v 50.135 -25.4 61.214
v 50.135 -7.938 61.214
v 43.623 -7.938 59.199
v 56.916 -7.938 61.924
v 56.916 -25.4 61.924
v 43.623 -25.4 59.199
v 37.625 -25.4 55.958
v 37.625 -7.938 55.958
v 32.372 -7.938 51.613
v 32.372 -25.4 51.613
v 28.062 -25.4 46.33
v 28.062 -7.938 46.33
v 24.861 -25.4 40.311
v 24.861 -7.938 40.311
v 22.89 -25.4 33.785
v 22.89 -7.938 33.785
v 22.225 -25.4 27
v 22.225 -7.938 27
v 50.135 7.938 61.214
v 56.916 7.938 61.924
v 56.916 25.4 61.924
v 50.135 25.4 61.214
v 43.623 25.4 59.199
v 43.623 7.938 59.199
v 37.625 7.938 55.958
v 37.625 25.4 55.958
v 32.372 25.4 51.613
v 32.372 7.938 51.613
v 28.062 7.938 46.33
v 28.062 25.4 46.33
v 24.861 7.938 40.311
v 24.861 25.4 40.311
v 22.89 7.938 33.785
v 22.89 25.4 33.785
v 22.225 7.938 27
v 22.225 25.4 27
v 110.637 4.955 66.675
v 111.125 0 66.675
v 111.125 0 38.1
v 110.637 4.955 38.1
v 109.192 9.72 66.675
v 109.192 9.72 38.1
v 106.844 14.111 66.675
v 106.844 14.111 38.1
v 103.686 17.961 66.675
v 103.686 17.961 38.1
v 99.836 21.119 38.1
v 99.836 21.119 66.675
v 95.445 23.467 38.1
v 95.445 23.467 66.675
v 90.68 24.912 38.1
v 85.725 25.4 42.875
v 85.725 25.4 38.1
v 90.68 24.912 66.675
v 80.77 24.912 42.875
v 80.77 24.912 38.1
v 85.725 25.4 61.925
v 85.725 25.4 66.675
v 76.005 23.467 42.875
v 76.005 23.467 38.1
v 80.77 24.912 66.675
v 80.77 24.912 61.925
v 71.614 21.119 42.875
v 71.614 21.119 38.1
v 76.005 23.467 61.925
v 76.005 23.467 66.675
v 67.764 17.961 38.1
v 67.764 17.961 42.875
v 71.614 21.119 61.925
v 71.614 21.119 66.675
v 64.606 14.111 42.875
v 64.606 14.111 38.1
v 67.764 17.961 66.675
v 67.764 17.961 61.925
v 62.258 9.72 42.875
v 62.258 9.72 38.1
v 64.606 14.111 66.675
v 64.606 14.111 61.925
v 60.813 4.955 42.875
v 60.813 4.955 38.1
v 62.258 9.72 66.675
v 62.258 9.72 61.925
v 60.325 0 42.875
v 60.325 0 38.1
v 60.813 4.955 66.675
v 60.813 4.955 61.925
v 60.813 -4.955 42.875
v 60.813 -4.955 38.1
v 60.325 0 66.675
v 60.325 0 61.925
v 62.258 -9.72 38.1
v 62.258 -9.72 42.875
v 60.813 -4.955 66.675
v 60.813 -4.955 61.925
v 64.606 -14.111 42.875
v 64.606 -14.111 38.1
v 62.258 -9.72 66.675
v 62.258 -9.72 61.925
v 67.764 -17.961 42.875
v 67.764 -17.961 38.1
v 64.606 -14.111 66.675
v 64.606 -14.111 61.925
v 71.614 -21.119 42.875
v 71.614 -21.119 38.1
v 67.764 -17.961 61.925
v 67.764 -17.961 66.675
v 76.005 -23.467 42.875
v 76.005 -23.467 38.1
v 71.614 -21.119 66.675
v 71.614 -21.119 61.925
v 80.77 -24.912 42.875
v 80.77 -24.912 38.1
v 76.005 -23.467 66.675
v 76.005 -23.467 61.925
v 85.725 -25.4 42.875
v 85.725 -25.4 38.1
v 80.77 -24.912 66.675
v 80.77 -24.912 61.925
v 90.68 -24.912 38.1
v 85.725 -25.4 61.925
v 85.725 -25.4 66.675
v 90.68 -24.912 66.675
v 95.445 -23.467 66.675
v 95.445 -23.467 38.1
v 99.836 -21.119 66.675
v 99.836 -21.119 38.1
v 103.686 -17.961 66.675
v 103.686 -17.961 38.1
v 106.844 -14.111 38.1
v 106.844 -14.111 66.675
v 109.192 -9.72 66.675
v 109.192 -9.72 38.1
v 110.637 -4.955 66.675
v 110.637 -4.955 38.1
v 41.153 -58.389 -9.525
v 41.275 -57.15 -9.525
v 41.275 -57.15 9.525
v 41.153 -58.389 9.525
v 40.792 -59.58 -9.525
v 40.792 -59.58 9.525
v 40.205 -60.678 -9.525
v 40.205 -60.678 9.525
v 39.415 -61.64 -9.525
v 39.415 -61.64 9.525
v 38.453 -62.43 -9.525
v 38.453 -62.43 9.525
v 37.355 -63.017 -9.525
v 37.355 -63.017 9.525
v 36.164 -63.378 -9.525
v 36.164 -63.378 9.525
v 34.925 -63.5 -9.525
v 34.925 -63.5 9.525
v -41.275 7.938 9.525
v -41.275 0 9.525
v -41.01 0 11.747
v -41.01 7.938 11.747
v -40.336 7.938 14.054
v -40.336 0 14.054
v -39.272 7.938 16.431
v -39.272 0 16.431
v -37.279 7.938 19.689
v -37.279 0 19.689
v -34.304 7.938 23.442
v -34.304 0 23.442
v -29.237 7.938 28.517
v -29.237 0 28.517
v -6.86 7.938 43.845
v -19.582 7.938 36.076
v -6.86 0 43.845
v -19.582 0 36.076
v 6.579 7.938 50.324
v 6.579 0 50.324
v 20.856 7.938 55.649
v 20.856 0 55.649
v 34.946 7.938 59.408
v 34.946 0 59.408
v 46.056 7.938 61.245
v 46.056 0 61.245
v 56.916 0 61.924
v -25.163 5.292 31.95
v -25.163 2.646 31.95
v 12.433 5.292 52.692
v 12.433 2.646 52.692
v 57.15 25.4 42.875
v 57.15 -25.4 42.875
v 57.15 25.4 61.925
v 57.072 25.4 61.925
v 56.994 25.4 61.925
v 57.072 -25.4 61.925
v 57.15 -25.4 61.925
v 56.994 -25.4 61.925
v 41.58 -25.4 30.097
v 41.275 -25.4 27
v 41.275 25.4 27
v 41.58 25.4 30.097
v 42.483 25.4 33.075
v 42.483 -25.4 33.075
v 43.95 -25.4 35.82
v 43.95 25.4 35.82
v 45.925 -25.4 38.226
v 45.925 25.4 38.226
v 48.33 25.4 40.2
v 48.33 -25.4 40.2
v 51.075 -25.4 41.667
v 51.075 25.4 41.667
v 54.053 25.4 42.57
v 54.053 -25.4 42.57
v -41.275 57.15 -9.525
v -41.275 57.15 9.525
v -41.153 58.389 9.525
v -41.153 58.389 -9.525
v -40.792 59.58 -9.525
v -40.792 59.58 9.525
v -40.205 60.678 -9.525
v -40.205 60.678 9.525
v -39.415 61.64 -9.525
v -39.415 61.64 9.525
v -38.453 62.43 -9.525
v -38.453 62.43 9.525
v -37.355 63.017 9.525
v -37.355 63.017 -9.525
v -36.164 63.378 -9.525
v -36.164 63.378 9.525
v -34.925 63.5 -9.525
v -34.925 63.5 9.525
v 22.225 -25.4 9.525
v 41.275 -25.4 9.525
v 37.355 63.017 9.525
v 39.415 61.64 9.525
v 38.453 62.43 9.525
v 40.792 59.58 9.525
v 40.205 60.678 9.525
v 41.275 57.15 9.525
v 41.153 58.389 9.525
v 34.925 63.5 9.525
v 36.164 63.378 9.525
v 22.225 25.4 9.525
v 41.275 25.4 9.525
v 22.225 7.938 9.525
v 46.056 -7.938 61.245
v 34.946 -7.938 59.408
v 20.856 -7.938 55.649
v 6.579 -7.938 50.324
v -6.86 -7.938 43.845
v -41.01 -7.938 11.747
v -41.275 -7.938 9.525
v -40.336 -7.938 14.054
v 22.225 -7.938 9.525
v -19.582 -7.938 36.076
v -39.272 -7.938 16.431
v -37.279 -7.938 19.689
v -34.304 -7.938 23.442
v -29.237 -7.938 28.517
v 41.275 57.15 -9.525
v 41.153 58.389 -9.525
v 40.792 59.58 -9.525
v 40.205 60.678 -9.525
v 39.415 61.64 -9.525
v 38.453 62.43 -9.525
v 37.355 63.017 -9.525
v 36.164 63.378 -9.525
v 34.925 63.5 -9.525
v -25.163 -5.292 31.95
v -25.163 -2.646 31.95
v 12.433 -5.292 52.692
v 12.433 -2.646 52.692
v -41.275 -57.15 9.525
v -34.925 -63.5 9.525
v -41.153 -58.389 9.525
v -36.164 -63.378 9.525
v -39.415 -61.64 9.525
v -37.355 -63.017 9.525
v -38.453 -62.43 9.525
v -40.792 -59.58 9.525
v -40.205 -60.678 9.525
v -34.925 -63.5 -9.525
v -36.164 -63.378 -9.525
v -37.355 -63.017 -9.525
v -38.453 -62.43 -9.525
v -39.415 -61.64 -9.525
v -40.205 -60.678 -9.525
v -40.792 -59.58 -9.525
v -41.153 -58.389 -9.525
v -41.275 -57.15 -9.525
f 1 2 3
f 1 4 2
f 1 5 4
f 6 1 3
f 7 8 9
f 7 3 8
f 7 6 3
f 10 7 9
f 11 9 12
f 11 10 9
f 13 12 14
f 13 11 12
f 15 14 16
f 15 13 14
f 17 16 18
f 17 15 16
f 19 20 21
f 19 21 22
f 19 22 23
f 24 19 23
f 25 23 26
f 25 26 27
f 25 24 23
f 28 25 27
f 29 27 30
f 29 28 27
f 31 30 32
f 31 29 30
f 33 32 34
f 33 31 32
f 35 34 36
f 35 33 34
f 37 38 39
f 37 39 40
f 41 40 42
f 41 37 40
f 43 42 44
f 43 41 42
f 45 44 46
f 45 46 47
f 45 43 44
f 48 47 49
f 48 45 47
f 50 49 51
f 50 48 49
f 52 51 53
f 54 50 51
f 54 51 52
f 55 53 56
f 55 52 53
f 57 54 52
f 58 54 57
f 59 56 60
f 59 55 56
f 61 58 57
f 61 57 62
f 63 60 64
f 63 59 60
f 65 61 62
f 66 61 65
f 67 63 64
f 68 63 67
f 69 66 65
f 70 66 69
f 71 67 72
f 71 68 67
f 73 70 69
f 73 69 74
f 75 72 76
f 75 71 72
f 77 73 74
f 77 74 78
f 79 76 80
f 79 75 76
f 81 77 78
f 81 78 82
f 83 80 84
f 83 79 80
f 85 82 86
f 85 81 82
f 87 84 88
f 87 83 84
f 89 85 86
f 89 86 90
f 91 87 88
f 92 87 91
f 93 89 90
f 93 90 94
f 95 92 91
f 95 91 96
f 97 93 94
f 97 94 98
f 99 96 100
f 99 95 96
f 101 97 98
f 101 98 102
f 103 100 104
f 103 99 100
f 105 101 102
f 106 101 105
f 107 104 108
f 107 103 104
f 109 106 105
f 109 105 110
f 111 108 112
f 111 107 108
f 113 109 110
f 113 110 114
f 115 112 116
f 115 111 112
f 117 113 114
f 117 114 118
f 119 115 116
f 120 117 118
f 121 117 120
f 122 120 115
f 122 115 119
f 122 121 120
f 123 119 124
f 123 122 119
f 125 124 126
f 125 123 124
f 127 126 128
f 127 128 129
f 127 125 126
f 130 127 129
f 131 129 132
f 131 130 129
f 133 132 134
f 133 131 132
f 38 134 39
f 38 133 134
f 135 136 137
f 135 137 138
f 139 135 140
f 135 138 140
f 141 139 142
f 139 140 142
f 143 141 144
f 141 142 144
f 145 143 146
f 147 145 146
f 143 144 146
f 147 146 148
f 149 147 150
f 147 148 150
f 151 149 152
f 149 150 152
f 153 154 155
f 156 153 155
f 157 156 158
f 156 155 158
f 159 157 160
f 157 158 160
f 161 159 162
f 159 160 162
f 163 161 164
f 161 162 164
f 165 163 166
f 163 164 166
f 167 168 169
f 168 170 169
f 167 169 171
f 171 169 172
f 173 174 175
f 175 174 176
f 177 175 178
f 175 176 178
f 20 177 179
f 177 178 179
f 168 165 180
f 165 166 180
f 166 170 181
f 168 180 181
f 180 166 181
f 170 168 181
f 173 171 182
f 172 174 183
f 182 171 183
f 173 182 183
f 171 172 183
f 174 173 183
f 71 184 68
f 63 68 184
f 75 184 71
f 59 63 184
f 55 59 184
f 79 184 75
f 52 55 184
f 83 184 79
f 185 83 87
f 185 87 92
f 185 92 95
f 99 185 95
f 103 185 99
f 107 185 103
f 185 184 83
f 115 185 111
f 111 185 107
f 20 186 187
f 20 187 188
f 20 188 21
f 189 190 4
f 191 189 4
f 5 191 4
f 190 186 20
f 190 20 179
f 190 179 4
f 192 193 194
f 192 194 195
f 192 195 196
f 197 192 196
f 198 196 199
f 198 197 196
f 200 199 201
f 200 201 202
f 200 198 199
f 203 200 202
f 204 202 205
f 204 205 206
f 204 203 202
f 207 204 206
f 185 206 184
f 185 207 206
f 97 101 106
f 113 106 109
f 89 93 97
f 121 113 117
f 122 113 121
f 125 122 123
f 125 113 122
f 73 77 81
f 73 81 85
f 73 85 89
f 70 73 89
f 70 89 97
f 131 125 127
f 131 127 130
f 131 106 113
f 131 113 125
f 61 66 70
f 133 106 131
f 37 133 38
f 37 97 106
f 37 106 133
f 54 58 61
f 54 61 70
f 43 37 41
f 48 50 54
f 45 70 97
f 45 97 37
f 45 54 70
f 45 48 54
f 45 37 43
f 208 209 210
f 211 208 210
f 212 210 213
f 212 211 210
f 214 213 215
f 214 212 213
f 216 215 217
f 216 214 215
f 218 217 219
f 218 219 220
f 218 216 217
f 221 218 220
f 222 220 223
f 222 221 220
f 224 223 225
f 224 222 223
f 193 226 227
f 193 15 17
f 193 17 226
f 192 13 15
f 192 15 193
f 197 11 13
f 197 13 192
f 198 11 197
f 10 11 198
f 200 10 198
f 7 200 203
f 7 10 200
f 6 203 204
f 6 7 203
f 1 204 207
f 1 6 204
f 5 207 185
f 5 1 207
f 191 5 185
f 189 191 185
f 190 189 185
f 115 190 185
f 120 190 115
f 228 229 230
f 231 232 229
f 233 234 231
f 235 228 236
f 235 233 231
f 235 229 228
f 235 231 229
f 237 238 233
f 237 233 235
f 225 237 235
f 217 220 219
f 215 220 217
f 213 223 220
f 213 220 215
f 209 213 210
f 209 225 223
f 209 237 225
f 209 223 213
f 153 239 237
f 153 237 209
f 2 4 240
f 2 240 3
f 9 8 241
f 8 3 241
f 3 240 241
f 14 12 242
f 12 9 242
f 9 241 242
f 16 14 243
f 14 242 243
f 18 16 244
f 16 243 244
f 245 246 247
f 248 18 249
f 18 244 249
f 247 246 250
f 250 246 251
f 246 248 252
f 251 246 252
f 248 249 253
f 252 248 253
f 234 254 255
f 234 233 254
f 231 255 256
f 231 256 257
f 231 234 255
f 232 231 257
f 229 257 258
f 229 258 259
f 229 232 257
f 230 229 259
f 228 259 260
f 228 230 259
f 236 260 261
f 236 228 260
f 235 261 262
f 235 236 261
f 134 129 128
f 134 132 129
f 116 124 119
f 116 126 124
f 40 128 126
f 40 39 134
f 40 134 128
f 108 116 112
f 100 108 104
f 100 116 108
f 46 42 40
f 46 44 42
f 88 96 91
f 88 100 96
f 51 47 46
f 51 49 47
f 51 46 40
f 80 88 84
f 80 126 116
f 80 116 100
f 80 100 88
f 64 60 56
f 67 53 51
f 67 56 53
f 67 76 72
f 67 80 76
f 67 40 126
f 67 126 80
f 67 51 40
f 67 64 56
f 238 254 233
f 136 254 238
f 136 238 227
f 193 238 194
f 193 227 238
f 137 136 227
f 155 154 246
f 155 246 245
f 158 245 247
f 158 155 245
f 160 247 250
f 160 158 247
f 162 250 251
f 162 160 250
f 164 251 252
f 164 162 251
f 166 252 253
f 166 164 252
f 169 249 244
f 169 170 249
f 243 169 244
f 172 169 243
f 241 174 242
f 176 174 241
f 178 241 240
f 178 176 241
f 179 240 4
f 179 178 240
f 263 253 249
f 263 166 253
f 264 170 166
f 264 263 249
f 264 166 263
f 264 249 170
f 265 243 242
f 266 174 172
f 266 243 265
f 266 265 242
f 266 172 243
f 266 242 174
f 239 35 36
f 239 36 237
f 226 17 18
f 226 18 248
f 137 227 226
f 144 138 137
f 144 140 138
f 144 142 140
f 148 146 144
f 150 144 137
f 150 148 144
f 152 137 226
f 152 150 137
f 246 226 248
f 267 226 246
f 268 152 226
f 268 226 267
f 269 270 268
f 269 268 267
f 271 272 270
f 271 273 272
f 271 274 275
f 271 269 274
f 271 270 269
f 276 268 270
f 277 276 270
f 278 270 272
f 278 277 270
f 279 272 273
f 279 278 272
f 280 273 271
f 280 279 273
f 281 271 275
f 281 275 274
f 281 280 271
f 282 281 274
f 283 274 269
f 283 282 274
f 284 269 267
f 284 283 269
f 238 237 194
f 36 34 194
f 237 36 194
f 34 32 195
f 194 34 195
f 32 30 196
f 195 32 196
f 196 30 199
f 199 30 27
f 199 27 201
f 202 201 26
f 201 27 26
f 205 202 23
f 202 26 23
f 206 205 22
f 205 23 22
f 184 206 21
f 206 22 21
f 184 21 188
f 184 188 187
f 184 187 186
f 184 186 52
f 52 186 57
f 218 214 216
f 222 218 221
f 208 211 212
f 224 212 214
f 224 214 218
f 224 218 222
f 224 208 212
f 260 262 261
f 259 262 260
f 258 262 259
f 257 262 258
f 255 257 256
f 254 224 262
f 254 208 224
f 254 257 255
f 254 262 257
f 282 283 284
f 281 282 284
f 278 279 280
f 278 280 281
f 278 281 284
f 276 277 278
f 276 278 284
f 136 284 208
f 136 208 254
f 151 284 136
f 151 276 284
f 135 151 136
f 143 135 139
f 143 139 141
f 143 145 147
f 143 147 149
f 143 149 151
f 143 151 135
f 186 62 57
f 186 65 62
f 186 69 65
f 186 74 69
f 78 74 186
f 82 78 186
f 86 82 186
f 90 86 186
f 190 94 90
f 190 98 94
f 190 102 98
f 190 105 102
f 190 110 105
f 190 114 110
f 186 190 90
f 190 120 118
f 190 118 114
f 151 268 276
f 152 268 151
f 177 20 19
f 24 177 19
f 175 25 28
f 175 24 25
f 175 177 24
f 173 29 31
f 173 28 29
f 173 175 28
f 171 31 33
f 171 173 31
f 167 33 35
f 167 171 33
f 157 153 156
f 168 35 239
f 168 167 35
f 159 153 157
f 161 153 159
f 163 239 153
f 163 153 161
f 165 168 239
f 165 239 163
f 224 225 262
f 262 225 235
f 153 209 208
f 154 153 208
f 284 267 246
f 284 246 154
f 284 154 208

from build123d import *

# Parameters (mm, degrees)
F1_DEPTH = 63.5
F0_W     = 25.4
F0_H     = 19.05
F2_DEPTH = 25.4
F3_DEPTH = 7.9375
F5_R     = 6.35


with BuildPart() as f1:
    # F0 (on Front) → F1 (new body, symmetric)
    with BuildSketch(Plane.XZ):
        Polygon((-41.275, 9.525), (-41.275, -9.525), (41.275, -9.525), (41.275, 9.525), (22.225, 9.525), align=None)
    extrude(amount=F1_DEPTH, both=True)

    # F0 (on Front) → F2 (join, symmetric)
    with BuildSketch(Plane.XZ):
        with BuildLine():
            Line((22.225, 9.525), (41.275, 9.525))
            Line((41.275, 9.525), (41.275, 27.0002))
            ThreePointArc((41.275, 27.0002), (45.9246798487, 38.2255201513), (57.15, 42.8752))
            Line((57.15, 42.8752), (60.325, 42.8752))
            Line((60.325, 42.8752), (60.325, 61.9252))
            Line((60.325, 61.9252), (57.15, 61.9252))
            ThreePointArc((57.15, 61.9252), (57.0327801624, 61.9250032852), (56.9155616453, 61.924413143))
            ThreePointArc((56.9155616453, 61.924413143), (32.3715478234, 51.6128782925), (22.225, 27.0002))
            Line((22.225, 27.0002), (22.225, 9.525))
        make_face()
        with Locations((73.025, 52.4002)):
            Rectangle(F0_W, F0_H)
    extrude(amount=F2_DEPTH, both=True)

    # F0 (on Front) → F3 (join, symmetric)
    with BuildSketch(Plane.XZ):
        with BuildLine():
            add(Edge.make_bspline(
                [(-41.275, 9.525), (-40.772556892, 29.51723469), (13.8574212283, 61.721808406), (56.9155616453, 61.924413143)],
                knots=[0, 0, 0, 0, 111.3024346727, 111.3024346727, 111.3024346727, 111.3024346727], degree=3))
            Line((-41.275, 9.525), (22.225, 9.525))
            Line((22.225, 9.525), (22.225, 27.0002))
            ThreePointArc((22.225, 27.0002), (32.3715478234, 51.6128782925), (56.9155616453, 61.924413143))
        make_face()
    extrude(amount=F3_DEPTH, both=True)

    # F0 (on Front) → F4 (revolve)
    with BuildSketch(Plane.XZ):
        Polygon((85.725, 66.675), (85.725, 61.9252), (85.725, 42.8752), (85.725, 38.1), (111.125, 38.1), (111.125, 66.675), align=None)
    revolve(axis=Axis((85.725, 0, 52.3875), (0, 0, 1)))

    # F5
    f5_edges = [f1.edges().sort_by_distance(p)[0] for p in [
        (41.275, -63.5, 0),
        (41.275, 63.5, 0),
        (-41.275, -63.5, 0),
        (-41.275, 63.5, 0),
    ]]
    fillet(f5_edges, radius=F5_R)


solid = f1.part
